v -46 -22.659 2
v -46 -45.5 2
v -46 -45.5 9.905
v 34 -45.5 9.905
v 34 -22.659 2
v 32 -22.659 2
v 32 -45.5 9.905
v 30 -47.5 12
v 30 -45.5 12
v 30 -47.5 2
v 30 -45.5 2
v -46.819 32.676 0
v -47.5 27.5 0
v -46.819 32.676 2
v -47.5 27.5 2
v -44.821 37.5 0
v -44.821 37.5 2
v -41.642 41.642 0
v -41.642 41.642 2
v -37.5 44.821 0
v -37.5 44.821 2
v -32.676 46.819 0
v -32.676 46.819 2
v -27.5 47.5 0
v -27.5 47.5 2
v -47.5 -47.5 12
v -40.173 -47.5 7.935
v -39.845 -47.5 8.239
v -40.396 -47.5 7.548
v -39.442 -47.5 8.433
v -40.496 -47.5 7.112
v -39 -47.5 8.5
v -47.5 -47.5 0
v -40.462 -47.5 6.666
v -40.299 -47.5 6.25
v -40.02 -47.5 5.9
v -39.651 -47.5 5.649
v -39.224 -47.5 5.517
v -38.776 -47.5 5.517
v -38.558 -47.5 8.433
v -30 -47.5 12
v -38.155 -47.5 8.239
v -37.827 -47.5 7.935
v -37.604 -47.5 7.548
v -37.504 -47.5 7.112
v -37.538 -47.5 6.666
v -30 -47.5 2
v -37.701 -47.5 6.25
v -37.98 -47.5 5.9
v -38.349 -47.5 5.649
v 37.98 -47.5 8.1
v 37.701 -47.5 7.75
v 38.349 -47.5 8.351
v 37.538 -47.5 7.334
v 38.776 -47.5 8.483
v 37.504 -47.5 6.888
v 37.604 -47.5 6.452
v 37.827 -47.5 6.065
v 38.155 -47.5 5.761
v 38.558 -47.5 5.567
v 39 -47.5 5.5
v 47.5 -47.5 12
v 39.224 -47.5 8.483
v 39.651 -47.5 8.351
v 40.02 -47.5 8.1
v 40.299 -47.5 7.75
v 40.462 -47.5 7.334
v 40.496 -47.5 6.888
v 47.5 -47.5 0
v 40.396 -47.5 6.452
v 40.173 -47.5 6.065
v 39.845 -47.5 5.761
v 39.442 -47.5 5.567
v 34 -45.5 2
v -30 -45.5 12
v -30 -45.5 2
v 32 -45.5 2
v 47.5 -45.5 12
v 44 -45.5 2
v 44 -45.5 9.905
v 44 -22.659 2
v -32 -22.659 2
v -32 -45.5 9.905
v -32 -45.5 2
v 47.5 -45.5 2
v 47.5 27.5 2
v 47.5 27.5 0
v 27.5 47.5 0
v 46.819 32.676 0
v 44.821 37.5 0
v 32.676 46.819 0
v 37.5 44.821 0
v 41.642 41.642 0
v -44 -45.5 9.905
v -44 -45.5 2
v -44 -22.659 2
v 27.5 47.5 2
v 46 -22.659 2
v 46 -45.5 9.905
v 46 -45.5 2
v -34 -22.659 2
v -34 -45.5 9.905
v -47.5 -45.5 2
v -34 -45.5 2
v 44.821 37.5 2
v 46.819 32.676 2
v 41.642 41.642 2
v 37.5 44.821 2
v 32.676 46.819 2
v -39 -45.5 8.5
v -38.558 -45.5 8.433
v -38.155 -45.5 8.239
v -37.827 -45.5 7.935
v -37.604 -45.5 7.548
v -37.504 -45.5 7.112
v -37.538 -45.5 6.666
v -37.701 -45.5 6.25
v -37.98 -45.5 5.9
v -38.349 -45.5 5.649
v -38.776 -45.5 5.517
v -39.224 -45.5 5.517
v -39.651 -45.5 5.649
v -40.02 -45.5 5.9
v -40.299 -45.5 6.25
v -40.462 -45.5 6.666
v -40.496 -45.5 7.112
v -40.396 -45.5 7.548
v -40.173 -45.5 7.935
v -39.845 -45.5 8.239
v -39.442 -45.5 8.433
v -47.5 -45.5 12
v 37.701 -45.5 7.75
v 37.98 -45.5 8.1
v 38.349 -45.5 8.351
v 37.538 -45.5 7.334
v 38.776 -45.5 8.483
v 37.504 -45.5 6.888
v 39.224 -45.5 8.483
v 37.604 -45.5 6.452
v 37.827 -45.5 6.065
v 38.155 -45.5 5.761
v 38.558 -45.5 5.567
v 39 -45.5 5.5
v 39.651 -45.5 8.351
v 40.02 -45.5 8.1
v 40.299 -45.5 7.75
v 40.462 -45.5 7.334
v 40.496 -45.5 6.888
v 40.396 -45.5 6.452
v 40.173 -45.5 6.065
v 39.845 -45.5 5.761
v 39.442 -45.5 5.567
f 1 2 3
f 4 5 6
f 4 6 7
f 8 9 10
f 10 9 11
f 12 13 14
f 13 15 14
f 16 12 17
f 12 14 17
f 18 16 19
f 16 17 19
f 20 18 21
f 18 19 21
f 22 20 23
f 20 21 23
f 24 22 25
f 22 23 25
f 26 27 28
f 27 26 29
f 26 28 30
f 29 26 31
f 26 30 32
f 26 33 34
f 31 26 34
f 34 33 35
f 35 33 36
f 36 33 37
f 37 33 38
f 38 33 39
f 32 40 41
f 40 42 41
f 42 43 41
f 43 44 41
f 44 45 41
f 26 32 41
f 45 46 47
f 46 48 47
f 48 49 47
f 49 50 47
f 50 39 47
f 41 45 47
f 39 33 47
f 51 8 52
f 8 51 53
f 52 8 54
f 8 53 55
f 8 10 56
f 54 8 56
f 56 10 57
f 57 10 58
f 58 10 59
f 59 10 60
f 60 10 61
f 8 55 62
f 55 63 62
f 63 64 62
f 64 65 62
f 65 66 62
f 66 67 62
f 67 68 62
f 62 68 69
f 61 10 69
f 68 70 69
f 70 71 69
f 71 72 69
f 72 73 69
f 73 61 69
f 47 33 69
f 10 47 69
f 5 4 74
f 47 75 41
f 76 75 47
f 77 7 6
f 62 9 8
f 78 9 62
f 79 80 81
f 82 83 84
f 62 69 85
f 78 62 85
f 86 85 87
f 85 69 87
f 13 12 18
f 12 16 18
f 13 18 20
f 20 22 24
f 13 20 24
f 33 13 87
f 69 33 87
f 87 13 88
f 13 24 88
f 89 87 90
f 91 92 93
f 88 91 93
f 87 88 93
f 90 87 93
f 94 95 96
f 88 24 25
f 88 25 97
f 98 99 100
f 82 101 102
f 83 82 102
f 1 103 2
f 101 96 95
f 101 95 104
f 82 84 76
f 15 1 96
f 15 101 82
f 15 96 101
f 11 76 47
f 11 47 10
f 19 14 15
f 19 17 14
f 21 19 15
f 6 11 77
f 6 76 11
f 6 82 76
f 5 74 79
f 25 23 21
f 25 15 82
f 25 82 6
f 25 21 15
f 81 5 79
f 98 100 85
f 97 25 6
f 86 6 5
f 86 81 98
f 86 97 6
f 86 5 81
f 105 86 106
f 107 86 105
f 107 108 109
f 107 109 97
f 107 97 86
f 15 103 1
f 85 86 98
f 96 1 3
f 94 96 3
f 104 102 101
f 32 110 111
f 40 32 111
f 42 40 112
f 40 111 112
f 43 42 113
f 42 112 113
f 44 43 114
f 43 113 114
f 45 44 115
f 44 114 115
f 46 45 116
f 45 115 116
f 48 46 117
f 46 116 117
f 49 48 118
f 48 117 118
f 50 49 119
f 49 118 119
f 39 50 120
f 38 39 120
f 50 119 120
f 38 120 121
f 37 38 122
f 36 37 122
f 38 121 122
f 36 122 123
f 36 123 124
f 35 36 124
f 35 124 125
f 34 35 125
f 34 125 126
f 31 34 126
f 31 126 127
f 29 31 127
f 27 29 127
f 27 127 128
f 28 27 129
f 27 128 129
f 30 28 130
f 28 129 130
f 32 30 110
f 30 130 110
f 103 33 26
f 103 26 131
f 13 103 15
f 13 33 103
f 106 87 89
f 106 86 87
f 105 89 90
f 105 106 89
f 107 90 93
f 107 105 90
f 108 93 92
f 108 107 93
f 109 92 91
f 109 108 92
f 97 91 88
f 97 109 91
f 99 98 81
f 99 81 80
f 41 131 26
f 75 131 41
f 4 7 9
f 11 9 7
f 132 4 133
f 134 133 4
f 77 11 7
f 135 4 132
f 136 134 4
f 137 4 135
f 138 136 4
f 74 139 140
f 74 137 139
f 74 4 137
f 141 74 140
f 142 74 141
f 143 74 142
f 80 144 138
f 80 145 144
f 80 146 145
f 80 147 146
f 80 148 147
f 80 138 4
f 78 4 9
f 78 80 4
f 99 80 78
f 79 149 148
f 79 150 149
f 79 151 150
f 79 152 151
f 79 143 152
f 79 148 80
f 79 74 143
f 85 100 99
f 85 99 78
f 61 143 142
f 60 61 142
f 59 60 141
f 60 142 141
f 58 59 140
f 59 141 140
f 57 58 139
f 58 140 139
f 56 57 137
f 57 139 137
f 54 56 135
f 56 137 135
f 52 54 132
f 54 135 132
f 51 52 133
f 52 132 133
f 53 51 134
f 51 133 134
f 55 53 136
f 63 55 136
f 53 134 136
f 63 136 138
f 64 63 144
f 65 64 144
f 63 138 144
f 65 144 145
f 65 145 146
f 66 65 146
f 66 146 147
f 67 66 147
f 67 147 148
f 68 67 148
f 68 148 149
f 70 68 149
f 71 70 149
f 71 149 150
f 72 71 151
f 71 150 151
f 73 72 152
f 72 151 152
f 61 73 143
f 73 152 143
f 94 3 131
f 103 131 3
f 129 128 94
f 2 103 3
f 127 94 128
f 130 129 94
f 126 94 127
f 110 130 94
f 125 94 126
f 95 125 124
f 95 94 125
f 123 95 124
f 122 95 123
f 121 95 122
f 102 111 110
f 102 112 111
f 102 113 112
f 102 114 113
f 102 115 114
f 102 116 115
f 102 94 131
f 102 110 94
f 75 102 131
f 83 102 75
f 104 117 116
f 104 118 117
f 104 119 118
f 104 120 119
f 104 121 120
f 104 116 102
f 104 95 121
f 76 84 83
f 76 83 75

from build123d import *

# Parameters (mm, degrees)
SKETCH_1_W             = 95
SKETCH_1_H             = 95
EXTRUDE_1_DEPTH        = 2
SKETCH_2_W             = 95
SKETCH_2_H             = 2
EXTRUDE_2_DEPTH        = 10
FILLET_1_R             = 20
SKETCH_3_W             = 60
SKETCH_3_H             = 10
CUT_EXTRUDE_1_DEPTH    = 106.115412761
EXTRUDE_START          = 33
EXTRUDE_3_DEPTH        = 1
PATTERN_LINEAR_1_COUNT = 2
PATTERN_LINEAR_1_PITCH = 12
MIRROR_START           = 33
MIRROR_1_COPY_1_DEPTH  = 1
SKETCH_7_R             = 1.5
CUT_EXTRUDE_2_DEPTH    = 2


with BuildPart() as part:
    # 草图1 → 凸台-拉伸1 (new body)
    with BuildSketch(Plane.XY):
        Rectangle(SKETCH_1_W, SKETCH_1_H)
    extrude(amount=EXTRUDE_1_DEPTH)

    # 草图2 → 凸台-拉伸2 (add)
    with BuildSketch(Plane.XY.offset(2)):
        with Locations((0, -46.5)):
            Rectangle(SKETCH_2_W, SKETCH_2_H)
    extrude(amount=EXTRUDE_2_DEPTH)

    # 圆角1
    fillet_1_edges = [part.edges().sort_by_distance(p)[0] for p in [
        (-47.5, 47.5, 1),
        (47.5, 47.5, 1),
    ]]
    fillet(fillet_1_edges, radius=FILLET_1_R)

    # 草图3 → 切除-拉伸1 (cut, through all)
    with BuildSketch(Plane(origin=(0, -45.5, 0), x_dir=(1, 0, 0), z_dir=(0, 1, 0))):
        with Locations((0, -7)):
            Rectangle(SKETCH_3_W, SKETCH_3_H)
    extrude(amount=-CUT_EXTRUDE_1_DEPTH, mode=Mode.SUBTRACT)

    # 草图5 → 凸台-拉伸3 (add, symmetric)
    with BuildSketch(Plane(origin=(0, 0, 0), x_dir=(0, 0, -1), z_dir=(1, 0, 0)).offset(EXTRUDE_START)):
        Polygon((-1.499876111, -46.213636553), (-1.499876111, -21.213636553), (-10.151701689, -46.213636553), align=None)
    extrude_3 = extrude(amount=EXTRUDE_3_DEPTH, both=True)

    # 阵列(线性)1: 凸台-拉伸3 ×2
    with Locations(*[(i * PATTERN_LINEAR_1_PITCH, 0, 0) for i in range(1, PATTERN_LINEAR_1_COUNT)]):
        add(extrude_3)

    # 镜向1: 凸台-拉伸3 across plane
    add(extrude_3.mirror(Plane(origin=(0, 0, 0), x_dir=(0, 0, 1), z_dir=(1, 0, 0))))

    # 镜向1 copy 1 sketch → 镜向1 copy 1 (add, symmetric)
    with BuildSketch(Plane(origin=(-12, 0, 0), x_dir=(0, 0, -1), z_dir=(-1, 0, 0)).offset(MIRROR_START)):
        Polygon((-1.499876111, 46.213636553), (-1.499876111, 21.213636553), (-10.151701689, 46.213636553), align=None)
    extrude(amount=MIRROR_1_COPY_1_DEPTH, both=True)

    # 草图7 → 切除-拉伸2 (cut)
    with BuildSketch(Plane(origin=(0, -45.5, 0), x_dir=(1, 0, 0), z_dir=(0, 1, 0))):
        with Locations(Location((-39, -7, 0), (0, 0, 270))):
            Circle(SKETCH_7_R)
        with Locations(Location((39, -7, 0), (0, 0, 90))):
            Circle(SKETCH_7_R)
    extrude(amount=-CUT_EXTRUDE_2_DEPTH, mode=Mode.SUBTRACT)


solid = part.part
